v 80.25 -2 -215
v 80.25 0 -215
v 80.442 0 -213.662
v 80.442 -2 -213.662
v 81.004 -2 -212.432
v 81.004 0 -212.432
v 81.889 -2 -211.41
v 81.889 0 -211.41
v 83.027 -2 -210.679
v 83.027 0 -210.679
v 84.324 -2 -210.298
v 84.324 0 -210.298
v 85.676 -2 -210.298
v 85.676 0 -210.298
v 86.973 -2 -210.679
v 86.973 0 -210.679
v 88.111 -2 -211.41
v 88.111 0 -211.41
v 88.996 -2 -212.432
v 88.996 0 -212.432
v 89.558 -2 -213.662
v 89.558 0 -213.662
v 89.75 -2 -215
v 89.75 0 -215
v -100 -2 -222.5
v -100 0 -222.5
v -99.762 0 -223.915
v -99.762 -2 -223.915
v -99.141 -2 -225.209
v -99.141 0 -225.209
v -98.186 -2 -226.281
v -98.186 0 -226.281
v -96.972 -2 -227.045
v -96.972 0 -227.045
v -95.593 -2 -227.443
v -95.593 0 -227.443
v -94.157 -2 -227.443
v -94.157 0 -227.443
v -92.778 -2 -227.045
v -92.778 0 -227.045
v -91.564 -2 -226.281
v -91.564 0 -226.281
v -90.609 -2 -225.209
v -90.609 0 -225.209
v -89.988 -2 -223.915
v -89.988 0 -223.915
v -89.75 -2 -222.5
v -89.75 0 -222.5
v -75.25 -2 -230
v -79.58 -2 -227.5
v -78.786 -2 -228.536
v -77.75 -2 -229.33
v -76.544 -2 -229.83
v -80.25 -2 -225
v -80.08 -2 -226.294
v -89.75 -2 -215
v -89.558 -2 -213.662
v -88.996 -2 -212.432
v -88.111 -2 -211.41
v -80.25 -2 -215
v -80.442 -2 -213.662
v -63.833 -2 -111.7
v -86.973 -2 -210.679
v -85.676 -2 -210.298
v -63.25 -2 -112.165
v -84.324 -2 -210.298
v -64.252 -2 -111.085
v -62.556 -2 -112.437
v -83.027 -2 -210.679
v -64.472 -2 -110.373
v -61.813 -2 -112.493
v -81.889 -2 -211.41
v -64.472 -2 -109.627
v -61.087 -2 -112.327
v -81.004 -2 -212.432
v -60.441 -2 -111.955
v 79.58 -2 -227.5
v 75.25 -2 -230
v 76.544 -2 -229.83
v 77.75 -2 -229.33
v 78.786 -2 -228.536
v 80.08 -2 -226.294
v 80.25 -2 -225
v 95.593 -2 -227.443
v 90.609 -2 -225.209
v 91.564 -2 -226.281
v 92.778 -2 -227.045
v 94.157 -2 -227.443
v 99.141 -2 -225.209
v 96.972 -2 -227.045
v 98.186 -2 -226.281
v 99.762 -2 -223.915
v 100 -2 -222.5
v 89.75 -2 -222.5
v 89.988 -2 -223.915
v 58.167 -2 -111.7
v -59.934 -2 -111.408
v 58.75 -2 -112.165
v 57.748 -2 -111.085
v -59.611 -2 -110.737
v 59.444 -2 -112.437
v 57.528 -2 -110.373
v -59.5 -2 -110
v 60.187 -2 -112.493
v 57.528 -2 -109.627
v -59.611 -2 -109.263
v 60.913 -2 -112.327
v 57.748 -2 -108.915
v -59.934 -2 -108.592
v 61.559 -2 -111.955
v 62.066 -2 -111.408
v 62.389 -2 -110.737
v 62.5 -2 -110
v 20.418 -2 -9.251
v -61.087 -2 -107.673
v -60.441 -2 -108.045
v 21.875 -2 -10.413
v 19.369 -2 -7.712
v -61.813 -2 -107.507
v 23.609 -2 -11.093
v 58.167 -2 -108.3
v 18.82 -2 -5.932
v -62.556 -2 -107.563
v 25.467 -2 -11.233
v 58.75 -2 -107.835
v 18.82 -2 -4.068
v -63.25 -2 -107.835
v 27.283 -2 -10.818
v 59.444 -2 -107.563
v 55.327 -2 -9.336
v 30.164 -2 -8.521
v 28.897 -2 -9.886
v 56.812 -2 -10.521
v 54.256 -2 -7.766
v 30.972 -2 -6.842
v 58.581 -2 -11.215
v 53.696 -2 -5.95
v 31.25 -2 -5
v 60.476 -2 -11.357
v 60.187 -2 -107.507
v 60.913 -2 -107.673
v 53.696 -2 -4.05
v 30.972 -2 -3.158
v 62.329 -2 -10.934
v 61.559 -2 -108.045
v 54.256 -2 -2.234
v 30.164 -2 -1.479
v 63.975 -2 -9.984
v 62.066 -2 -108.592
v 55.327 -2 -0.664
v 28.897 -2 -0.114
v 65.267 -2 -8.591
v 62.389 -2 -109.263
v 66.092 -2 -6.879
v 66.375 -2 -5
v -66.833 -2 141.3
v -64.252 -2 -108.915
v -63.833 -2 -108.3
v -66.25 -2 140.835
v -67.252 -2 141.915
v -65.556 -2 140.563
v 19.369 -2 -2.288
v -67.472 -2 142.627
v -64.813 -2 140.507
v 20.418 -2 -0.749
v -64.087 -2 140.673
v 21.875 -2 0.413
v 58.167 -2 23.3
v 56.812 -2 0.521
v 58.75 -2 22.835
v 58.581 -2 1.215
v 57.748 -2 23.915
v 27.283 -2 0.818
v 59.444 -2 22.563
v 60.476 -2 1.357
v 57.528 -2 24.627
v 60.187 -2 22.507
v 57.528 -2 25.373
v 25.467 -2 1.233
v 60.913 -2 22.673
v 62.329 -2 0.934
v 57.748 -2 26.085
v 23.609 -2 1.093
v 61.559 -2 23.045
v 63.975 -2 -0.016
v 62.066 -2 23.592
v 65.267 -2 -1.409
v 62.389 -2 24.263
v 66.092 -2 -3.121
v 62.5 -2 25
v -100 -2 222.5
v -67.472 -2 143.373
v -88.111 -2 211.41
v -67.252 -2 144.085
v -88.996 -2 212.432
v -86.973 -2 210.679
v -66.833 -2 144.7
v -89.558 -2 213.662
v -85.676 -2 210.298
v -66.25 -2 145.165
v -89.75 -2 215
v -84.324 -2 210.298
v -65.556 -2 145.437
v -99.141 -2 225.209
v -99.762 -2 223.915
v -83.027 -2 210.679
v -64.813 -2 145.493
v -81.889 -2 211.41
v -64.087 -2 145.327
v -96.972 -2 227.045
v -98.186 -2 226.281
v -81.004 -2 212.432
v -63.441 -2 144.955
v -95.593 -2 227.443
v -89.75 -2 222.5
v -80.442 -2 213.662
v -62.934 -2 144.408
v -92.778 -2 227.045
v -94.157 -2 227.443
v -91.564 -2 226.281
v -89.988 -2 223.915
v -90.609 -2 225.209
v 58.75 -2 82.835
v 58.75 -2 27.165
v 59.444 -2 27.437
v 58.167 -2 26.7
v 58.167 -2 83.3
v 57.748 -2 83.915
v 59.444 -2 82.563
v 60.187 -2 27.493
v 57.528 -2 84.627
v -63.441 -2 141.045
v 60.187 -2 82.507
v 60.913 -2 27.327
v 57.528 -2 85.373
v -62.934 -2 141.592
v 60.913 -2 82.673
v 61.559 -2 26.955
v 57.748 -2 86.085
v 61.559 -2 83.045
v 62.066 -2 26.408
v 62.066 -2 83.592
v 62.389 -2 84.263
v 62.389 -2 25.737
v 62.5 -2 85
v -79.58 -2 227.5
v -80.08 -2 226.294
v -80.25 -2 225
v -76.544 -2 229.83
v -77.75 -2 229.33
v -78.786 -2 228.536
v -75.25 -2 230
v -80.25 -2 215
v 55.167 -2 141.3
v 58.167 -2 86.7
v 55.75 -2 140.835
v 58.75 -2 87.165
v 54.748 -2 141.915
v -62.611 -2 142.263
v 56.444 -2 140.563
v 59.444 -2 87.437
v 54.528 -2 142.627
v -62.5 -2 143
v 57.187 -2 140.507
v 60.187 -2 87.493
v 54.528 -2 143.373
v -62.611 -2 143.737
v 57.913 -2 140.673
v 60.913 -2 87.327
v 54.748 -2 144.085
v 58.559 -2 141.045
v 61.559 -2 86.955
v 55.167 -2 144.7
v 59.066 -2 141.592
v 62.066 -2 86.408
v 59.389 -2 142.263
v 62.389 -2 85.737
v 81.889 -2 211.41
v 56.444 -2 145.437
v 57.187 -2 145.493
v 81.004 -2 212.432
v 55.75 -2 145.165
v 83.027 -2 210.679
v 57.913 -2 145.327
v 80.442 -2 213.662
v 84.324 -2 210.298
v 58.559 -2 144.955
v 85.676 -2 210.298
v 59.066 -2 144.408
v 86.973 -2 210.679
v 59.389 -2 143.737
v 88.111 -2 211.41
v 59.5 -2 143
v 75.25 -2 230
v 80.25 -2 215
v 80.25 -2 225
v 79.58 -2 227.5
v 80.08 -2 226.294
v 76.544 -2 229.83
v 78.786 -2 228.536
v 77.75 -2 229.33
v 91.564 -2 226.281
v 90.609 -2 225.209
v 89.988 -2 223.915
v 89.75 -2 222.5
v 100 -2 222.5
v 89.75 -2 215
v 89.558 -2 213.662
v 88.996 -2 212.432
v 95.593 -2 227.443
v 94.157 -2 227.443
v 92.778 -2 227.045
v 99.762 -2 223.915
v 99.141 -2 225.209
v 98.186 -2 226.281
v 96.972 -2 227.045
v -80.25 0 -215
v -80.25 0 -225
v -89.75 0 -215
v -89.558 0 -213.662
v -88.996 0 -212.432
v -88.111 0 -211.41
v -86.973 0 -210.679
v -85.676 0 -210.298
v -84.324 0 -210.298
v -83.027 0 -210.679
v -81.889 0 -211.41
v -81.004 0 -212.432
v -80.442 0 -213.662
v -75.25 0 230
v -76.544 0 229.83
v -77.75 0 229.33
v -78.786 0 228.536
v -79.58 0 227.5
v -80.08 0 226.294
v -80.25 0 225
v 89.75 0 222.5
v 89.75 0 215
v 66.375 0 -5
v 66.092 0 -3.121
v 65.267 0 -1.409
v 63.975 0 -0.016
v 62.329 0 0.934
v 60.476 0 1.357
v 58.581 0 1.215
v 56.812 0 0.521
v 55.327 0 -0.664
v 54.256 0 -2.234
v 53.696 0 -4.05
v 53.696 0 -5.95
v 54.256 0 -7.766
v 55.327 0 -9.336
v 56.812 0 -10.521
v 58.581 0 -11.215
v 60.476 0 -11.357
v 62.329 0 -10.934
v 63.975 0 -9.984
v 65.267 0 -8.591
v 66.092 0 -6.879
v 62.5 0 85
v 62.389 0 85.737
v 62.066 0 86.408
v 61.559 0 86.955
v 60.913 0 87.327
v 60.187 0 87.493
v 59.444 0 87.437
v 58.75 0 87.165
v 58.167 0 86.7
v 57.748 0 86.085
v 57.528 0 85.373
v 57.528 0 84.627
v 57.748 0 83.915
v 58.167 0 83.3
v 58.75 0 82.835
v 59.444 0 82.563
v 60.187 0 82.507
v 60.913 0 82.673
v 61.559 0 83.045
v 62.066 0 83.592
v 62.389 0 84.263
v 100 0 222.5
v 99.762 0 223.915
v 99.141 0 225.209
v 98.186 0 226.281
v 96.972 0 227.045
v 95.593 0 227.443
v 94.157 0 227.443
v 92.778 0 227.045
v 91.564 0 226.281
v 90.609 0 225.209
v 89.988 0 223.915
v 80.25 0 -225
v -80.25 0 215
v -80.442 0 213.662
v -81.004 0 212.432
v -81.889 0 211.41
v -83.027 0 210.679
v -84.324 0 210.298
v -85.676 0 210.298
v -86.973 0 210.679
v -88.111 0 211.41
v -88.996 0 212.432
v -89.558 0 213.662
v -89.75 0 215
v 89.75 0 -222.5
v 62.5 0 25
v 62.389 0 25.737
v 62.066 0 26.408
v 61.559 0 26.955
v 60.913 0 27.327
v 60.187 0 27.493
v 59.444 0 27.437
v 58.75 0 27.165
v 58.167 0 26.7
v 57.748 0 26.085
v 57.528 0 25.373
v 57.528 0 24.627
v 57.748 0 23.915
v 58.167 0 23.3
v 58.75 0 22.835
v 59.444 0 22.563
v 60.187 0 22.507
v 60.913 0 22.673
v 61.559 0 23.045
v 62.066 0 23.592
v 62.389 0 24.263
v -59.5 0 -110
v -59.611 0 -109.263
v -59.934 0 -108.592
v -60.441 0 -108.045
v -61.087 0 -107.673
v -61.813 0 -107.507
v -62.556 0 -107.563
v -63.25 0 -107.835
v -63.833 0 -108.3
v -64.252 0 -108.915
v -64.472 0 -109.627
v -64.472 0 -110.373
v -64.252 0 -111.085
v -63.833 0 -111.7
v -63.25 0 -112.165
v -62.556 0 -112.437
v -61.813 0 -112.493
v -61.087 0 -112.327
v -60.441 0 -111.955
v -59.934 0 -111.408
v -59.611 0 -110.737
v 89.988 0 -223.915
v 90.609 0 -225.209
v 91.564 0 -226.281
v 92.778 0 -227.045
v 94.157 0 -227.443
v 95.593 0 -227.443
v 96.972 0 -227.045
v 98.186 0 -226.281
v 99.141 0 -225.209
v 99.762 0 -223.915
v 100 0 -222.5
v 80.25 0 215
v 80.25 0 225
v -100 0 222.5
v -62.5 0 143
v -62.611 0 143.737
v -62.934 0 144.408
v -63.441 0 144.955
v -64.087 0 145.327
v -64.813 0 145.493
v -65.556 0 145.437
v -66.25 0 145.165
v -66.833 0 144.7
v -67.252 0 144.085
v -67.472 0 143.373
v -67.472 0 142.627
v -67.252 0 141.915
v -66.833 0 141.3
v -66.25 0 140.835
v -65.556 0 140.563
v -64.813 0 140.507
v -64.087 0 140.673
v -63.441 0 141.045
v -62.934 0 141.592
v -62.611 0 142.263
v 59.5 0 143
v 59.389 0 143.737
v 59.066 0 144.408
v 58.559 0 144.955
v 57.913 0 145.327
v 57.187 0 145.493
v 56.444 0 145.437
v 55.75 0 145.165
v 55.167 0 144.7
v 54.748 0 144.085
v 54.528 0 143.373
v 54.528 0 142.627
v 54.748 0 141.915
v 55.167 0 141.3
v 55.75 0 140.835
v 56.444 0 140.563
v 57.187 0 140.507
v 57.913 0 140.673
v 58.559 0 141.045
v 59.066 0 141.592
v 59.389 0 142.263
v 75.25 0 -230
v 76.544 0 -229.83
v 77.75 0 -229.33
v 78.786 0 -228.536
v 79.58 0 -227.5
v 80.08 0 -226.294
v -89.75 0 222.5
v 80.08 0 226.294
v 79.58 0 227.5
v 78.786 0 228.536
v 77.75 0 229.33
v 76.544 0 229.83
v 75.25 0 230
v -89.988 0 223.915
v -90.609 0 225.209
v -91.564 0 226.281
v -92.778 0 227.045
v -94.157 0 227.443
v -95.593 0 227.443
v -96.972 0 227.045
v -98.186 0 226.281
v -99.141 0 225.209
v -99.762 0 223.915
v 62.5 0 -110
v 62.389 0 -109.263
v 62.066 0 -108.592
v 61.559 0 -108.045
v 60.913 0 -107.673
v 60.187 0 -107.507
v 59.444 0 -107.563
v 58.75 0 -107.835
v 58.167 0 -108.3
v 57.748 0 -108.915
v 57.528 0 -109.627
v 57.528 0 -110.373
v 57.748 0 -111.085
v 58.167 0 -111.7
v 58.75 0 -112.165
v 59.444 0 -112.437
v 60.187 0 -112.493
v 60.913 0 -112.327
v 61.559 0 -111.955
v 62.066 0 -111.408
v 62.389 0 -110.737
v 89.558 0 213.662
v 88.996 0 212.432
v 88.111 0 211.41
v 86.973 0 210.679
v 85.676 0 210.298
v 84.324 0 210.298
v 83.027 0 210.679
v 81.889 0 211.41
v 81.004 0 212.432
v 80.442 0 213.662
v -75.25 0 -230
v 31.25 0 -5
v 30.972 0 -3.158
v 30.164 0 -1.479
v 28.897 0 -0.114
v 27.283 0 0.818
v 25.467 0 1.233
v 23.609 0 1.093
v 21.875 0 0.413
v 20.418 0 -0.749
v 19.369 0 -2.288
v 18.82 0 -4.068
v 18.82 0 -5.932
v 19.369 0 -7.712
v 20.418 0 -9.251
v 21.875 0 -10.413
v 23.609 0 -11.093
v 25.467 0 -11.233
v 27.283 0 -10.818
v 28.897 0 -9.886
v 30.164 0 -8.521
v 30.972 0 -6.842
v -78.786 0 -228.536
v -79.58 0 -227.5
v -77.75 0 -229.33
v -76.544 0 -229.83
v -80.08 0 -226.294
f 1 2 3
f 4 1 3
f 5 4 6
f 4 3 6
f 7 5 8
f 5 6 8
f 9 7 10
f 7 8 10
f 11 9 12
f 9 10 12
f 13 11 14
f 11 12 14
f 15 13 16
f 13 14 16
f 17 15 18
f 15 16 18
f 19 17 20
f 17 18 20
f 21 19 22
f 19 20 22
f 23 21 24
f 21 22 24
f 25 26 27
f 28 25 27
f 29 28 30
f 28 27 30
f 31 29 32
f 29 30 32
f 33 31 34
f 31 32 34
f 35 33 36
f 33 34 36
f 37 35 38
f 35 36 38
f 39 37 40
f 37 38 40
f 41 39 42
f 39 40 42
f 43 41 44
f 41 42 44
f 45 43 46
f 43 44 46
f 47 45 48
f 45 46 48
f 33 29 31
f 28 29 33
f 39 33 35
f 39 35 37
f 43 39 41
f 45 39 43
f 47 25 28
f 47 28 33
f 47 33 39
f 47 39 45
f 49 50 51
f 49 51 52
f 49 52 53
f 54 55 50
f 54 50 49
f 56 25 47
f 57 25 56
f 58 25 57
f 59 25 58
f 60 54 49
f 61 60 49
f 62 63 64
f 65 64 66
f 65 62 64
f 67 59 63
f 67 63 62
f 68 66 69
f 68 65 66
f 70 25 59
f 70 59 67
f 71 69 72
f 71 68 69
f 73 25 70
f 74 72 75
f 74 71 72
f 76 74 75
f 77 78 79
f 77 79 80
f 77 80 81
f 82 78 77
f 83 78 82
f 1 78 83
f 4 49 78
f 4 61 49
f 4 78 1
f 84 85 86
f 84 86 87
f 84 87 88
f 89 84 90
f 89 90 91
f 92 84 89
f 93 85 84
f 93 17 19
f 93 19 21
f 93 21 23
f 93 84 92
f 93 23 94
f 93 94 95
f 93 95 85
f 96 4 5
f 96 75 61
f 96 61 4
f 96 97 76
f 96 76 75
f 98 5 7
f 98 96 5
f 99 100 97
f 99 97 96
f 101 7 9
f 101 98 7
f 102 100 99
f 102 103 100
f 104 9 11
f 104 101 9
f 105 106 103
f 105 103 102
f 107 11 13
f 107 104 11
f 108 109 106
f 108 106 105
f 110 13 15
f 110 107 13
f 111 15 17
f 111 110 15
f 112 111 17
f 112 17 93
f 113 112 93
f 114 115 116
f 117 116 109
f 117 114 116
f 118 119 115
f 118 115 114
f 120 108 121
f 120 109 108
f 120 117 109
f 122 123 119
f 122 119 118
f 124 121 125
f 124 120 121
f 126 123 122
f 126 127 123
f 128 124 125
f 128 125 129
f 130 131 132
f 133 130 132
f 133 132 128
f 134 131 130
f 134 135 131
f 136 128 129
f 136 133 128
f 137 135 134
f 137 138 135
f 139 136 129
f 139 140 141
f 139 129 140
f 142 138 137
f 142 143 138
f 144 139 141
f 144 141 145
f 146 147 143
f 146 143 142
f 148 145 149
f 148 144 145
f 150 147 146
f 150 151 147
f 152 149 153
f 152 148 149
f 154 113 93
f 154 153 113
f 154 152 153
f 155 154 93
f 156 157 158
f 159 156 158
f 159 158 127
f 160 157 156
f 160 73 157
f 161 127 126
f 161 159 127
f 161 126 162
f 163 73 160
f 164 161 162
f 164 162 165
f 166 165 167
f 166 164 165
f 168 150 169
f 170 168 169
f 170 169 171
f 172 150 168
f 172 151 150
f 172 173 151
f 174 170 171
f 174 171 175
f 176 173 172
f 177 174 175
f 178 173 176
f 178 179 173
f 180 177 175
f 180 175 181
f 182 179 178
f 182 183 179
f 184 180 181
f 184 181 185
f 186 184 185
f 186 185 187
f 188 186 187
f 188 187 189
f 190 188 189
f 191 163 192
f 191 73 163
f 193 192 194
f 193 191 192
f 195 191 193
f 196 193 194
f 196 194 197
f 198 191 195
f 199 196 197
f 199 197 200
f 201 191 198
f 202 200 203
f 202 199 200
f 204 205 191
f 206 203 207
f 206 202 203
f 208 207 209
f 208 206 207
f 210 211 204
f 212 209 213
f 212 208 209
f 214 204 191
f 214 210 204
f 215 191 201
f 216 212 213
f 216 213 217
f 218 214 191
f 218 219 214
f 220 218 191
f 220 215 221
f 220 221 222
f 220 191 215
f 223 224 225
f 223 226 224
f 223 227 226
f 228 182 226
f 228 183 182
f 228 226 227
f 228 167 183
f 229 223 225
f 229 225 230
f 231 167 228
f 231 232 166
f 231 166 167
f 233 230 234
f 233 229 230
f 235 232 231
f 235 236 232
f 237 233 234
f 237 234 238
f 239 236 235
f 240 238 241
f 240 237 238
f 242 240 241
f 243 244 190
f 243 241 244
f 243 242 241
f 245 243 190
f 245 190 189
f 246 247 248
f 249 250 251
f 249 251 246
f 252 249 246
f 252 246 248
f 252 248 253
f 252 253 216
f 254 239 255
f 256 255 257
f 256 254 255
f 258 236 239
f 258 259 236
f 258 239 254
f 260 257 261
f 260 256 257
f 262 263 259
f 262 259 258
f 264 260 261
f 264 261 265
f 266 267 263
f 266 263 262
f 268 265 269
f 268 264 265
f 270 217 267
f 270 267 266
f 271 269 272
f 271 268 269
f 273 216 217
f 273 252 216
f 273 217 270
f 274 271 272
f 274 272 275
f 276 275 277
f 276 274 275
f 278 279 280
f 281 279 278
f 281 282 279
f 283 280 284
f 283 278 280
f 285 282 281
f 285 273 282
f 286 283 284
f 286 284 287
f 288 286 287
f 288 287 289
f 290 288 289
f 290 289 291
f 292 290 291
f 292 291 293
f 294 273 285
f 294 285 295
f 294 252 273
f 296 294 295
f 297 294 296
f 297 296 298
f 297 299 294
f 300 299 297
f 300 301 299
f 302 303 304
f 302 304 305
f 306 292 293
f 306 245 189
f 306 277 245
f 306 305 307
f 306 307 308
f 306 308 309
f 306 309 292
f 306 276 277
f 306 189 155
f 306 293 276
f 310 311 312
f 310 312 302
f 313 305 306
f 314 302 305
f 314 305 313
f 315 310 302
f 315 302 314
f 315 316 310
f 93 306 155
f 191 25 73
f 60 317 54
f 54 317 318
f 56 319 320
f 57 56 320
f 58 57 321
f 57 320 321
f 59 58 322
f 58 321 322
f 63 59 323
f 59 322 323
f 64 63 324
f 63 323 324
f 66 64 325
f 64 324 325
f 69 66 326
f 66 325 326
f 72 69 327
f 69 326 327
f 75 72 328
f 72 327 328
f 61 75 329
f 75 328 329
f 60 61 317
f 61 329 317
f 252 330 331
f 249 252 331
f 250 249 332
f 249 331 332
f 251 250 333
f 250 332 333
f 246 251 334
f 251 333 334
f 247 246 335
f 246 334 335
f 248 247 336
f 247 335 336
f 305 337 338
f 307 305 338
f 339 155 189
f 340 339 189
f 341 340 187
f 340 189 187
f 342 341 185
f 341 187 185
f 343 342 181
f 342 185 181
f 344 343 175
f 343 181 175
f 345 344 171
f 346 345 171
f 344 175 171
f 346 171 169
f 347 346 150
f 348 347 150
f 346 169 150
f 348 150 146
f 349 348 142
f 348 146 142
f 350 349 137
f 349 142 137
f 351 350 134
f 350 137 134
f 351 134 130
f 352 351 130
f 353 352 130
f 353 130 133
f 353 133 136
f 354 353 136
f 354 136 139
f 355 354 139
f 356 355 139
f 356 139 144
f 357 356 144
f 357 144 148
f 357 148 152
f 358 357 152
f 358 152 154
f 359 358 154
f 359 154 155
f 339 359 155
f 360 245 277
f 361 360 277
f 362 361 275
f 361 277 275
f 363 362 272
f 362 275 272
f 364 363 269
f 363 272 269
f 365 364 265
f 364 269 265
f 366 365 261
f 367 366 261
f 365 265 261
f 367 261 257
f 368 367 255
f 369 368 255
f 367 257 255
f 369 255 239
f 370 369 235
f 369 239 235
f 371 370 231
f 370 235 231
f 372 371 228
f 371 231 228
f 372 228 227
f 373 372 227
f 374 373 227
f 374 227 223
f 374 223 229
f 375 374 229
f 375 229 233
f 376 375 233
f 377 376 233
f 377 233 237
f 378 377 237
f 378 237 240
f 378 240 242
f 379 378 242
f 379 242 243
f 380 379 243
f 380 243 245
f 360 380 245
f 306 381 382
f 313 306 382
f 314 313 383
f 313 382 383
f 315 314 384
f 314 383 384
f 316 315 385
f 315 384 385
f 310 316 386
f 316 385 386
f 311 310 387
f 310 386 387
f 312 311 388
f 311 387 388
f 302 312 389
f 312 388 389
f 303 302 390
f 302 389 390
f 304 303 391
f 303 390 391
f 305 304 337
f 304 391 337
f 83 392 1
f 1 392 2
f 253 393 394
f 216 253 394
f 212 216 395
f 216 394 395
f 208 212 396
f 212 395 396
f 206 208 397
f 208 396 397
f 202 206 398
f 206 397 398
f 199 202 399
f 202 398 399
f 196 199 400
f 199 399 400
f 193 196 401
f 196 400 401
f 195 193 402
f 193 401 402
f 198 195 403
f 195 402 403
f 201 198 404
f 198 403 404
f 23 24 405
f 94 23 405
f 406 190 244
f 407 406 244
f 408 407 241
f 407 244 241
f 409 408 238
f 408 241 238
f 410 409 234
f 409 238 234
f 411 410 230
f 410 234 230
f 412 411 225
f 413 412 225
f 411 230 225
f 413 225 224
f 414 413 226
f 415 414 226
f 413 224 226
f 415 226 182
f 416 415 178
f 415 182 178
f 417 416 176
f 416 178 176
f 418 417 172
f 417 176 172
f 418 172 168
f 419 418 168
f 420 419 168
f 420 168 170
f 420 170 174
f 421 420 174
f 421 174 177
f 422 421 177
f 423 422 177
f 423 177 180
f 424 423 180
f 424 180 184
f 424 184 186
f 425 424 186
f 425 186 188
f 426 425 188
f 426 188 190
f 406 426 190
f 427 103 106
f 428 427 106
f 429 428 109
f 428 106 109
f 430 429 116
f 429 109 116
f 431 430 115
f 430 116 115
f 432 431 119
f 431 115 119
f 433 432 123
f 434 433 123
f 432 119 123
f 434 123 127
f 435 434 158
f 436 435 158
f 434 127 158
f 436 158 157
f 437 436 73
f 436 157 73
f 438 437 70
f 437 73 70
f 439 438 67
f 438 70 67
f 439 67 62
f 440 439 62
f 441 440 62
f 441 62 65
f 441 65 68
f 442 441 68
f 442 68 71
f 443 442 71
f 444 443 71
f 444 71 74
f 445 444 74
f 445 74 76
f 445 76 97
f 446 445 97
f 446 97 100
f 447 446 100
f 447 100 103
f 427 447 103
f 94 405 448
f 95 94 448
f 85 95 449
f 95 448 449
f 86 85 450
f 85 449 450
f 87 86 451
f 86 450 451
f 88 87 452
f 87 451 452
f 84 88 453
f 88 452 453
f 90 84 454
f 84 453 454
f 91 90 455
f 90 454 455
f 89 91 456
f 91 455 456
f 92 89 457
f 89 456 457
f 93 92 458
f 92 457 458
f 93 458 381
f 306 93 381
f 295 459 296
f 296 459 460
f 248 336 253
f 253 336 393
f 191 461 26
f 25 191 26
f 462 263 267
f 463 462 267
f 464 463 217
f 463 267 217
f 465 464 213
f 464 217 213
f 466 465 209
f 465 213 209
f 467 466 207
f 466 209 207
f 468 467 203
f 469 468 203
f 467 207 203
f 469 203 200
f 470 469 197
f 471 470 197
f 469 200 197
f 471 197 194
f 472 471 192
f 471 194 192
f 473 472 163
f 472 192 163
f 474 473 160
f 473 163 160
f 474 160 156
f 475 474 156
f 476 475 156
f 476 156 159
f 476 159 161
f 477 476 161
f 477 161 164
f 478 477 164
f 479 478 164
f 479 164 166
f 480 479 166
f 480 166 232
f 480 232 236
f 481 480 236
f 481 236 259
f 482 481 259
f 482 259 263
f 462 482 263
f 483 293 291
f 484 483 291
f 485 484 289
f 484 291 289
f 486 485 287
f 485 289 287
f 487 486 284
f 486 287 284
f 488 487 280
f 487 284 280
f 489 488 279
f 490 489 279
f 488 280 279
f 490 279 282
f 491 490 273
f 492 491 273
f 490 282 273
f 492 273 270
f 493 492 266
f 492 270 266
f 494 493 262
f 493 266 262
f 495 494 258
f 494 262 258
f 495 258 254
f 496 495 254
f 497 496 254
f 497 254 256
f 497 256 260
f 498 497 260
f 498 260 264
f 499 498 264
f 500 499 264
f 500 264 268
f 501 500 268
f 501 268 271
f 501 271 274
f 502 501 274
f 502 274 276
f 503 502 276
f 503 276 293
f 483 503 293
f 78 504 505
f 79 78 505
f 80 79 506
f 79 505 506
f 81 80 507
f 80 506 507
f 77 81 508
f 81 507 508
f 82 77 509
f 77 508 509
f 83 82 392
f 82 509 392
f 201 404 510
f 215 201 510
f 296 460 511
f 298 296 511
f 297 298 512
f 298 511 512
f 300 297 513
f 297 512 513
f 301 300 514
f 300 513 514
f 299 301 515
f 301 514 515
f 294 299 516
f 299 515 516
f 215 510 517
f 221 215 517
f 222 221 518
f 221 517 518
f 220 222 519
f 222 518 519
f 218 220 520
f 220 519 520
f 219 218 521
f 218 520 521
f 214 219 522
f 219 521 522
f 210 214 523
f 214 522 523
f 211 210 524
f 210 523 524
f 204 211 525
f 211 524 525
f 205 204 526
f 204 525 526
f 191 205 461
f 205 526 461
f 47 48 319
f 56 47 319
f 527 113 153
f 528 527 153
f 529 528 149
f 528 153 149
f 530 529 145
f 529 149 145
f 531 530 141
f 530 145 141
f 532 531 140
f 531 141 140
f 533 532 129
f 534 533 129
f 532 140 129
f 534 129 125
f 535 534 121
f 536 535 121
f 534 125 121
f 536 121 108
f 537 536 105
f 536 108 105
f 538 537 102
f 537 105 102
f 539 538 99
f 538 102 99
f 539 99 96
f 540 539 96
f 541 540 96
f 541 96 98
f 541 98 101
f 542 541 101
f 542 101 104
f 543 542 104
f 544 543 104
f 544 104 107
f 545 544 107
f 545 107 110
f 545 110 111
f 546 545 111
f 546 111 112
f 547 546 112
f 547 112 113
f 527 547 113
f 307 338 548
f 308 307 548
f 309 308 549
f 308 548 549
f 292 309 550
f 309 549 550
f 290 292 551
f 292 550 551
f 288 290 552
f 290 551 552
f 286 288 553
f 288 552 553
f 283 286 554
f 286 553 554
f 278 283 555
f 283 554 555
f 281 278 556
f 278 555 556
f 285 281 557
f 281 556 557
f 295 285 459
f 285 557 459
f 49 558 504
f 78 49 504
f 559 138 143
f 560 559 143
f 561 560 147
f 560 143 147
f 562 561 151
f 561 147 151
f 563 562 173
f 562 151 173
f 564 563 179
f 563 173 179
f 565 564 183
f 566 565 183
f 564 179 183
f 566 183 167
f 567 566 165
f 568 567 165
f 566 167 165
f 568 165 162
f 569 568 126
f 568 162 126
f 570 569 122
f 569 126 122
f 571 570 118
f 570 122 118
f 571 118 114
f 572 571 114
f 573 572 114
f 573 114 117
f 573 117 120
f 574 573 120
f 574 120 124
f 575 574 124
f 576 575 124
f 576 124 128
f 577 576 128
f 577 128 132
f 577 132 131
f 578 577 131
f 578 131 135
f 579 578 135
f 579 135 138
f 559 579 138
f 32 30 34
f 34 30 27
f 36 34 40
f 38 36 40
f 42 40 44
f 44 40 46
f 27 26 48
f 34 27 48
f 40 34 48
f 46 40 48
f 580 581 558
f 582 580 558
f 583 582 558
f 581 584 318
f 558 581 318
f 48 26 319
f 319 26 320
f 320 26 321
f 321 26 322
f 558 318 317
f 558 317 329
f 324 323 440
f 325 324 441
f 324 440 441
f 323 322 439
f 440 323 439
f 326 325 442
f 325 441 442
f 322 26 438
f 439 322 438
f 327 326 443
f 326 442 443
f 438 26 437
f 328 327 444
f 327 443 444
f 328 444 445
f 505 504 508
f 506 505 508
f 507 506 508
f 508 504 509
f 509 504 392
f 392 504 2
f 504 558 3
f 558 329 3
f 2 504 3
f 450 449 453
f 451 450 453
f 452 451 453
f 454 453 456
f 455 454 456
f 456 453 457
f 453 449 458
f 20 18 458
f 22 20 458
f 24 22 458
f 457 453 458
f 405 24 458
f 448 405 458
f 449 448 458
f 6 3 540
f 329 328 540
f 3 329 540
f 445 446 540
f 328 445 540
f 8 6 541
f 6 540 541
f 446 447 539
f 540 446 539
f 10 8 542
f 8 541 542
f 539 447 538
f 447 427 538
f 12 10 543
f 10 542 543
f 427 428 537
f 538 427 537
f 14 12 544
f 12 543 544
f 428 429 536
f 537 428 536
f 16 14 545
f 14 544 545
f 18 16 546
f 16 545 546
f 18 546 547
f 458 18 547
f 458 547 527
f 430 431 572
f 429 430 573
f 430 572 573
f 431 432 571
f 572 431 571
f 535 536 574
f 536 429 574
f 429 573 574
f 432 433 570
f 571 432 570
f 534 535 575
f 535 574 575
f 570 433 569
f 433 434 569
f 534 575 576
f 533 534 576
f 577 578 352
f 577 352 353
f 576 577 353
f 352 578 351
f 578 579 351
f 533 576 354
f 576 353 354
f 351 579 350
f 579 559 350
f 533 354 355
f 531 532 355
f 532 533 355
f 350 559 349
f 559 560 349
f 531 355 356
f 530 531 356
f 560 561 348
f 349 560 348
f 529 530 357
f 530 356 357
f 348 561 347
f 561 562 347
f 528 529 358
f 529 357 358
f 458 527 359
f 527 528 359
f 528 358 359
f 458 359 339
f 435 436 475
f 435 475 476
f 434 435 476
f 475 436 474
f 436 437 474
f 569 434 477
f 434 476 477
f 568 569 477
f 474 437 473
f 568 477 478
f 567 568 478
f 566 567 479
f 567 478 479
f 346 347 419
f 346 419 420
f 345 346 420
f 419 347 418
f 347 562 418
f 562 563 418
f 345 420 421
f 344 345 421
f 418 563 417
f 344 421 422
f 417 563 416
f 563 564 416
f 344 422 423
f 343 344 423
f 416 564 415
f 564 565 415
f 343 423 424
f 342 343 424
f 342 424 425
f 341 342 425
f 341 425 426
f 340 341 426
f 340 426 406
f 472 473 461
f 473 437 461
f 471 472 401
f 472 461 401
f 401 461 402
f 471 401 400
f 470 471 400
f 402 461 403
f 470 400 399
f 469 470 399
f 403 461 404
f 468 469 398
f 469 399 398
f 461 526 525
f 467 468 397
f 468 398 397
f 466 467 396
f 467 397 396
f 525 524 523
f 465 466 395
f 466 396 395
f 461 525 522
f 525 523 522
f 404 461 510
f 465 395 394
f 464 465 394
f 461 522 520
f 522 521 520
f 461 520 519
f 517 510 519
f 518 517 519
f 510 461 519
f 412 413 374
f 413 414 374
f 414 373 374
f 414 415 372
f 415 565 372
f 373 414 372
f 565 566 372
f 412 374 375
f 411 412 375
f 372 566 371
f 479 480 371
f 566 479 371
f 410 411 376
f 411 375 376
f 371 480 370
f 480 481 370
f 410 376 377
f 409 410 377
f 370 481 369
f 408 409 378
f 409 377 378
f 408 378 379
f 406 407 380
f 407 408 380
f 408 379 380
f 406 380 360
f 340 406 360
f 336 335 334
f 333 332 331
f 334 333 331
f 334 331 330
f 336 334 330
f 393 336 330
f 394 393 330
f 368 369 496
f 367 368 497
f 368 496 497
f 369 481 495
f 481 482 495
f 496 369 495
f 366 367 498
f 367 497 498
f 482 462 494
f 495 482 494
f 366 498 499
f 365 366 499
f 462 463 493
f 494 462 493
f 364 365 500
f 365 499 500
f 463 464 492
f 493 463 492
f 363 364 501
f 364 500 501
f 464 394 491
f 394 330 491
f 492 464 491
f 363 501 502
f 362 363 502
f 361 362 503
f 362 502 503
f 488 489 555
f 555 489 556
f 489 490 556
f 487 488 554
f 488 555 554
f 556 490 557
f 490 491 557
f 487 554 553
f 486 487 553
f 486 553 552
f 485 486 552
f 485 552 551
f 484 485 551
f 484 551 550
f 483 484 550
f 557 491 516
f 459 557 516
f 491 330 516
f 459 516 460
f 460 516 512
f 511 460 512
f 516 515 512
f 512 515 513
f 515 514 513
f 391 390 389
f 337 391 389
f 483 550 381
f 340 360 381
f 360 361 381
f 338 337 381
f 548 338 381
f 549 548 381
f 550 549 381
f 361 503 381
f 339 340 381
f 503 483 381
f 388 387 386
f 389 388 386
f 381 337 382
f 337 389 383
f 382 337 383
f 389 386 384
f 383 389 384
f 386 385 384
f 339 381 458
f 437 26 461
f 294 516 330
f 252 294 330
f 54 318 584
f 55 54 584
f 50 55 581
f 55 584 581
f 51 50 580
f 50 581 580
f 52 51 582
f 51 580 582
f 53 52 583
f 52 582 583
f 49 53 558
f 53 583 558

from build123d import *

# Parameters (mm, degrees)
F1_DEPTH = 2
F2_R     = 6.25
F3_DEPTH = 2.001
F4_R     = 2.5
F4_R_2   = 6.375
F5_DEPTH = 25


with BuildPart() as f1:
    # F0 (on Front) → F1 (new body)
    with BuildSketch(Plane.XZ):
        with BuildLine():
            ThreePointArc((-80.25, -225), (-78.785534, -228.535534), (-75.25, -230))
            Line((-75.25, -230), (75.25, -230))
            ThreePointArc((75.25, -230), (78.785534, -228.535534), (80.25, -225))
            Line((80.25, -225), (80.25, -215))
            ThreePointArc((80.25, -215), (85, -210.25), (89.75, -215))
            Line((89.75, -215), (89.75, -222.5))
            ThreePointArc((89.75, -222.5), (94.875, -227.49362), (100, -222.5))
            Line((100, -222.5), (100, 222.5))
            ThreePointArc((100, 222.5), (94.875, 227.49362), (89.75, 222.5))
            Line((89.75, 222.5), (89.75, 215))
            ThreePointArc((89.75, 215), (85, 210.25), (80.25, 215))
            Line((80.25, 215), (80.25, 225))
            ThreePointArc((80.25, 225), (78.785534, 228.535534), (75.25, 230))
            Line((75.25, 230), (-75.25, 230))
            ThreePointArc((-75.25, 230), (-78.785534, 228.535534), (-80.25, 225))
            Line((-80.25, 225), (-80.25, 215))
            ThreePointArc((-80.25, 215), (-85, 210.25), (-89.75, 215))
            Line((-89.75, 215), (-89.75, 222.5))
            ThreePointArc((-89.75, 222.5), (-94.875, 227.49362), (-100, 222.5))
            Line((-100, 222.5), (-100, -222.5))
            ThreePointArc((-100, -222.5), (-94.875, -227.49362), (-89.75, -222.5))
            Line((-89.75, -222.5), (-89.75, -215))
            ThreePointArc((-89.75, -215), (-85, -210.25), (-80.25, -215))
            Line((-80.25, -215), (-80.25, -225))
        make_face()
    extrude(amount=F1_DEPTH)

    # F2 (on face) → F3 (cut, through all)
    with BuildSketch(Plane.XZ.offset(2)):
        with Locations((25, -5)):
            Circle(F2_R)
    extrude(amount=-F3_DEPTH, mode=Mode.SUBTRACT)

    # F4 (on face) → F5 (cut)
    with BuildSketch(Plane.XZ.offset(2)):
        with Locations((-62, -110)):
            Circle(F4_R)
        with Locations((60, -110)):
            Circle(F4_R)
        with Locations((60, -5)):
            Circle(F4_R_2)
        with Locations((60, 25)):
            Circle(F4_R)
        with Locations((60, 85)):
            Circle(F4_R)
        with Locations((-65, 143)):
            Circle(F4_R)
        with Locations((57, 143)):
            Circle(F4_R)
    extrude(amount=-F5_DEPTH, mode=Mode.SUBTRACT)


solid = f1.part
